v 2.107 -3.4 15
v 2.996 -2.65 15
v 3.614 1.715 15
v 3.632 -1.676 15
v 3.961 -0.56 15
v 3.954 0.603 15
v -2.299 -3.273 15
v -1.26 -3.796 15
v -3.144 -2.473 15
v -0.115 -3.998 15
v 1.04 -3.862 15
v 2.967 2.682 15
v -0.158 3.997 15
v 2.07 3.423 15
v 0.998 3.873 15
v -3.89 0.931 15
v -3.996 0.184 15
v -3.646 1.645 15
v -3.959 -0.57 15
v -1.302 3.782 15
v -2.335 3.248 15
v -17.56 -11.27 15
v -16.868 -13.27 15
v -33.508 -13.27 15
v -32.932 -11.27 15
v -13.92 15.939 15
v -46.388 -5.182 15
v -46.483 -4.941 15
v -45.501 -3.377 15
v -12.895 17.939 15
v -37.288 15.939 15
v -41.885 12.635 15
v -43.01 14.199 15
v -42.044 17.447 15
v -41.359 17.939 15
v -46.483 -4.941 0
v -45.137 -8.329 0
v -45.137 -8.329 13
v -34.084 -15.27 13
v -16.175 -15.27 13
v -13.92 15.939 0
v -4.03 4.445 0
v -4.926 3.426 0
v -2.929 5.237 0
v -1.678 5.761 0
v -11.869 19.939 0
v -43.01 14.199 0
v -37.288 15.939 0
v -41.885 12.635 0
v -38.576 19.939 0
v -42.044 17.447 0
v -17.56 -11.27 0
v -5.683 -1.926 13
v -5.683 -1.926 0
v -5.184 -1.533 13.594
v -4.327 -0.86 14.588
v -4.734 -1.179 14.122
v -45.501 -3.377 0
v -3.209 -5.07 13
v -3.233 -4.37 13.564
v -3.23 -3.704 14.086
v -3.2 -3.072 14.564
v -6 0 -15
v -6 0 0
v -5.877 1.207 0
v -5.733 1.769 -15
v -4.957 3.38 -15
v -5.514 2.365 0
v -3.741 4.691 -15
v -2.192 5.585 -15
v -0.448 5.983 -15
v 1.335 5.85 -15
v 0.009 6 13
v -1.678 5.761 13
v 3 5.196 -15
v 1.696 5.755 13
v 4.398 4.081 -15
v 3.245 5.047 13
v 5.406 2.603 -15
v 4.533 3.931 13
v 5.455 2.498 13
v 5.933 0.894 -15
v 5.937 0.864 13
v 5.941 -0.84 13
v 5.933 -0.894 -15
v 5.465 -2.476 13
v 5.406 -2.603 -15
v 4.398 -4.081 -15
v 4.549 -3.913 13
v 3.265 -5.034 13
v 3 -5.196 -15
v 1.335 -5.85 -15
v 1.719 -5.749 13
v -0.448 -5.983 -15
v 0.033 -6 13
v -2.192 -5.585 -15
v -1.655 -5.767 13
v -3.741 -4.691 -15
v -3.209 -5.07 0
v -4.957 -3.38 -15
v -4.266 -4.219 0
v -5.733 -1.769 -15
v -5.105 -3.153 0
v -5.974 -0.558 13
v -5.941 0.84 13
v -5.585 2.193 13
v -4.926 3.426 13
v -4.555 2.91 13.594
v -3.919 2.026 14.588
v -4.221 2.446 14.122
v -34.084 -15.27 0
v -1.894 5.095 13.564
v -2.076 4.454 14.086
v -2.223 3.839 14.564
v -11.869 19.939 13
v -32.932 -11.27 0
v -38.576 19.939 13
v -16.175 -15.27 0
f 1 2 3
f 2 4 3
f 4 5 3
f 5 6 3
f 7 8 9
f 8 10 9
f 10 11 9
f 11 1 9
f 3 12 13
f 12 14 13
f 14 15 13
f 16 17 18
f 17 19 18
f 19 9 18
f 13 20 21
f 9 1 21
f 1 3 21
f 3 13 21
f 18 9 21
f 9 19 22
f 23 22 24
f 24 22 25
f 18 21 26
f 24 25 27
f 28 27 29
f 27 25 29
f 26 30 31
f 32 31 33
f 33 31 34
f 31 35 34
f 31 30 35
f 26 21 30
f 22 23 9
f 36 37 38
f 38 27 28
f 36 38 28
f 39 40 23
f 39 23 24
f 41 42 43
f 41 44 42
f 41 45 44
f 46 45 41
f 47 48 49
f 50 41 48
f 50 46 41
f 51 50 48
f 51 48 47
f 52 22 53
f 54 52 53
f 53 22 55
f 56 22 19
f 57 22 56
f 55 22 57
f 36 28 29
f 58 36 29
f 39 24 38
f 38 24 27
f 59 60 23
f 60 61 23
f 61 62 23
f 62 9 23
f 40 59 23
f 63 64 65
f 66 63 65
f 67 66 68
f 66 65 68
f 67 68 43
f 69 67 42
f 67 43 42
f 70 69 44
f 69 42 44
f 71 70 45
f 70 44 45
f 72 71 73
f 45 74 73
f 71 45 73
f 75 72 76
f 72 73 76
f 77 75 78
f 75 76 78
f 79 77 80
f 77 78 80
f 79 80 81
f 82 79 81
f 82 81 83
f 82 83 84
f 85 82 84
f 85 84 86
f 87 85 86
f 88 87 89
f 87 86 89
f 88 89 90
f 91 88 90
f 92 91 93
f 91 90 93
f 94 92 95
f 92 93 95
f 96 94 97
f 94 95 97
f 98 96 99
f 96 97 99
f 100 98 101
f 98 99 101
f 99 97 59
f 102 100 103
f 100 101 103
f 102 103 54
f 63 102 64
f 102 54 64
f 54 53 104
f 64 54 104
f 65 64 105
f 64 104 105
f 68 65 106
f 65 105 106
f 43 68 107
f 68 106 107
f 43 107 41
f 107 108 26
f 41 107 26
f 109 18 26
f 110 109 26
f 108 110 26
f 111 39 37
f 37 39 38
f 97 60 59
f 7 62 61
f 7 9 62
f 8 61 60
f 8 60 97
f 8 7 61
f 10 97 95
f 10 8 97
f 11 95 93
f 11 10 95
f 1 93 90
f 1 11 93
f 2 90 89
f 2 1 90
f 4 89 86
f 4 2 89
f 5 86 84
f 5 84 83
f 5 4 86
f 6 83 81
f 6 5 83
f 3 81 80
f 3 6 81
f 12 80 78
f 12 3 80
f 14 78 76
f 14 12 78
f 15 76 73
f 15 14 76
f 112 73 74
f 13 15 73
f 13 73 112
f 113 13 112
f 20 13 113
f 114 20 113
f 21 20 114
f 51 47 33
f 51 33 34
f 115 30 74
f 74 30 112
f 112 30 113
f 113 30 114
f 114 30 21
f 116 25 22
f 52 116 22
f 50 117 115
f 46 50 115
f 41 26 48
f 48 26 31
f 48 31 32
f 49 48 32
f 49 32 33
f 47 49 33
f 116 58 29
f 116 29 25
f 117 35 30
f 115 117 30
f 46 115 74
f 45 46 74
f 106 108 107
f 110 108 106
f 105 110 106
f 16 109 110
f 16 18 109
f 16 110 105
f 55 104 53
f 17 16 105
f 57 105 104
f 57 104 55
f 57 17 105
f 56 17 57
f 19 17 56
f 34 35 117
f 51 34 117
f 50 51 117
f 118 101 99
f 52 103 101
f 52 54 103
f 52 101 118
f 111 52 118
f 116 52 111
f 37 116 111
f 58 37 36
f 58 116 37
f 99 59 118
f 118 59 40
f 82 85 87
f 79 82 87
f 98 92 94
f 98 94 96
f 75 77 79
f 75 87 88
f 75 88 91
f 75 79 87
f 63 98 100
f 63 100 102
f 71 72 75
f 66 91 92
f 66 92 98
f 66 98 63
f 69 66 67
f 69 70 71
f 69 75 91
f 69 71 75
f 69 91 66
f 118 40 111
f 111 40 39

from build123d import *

# Parameters (mm, degrees)
SKETCH1_R           = 6
BOSS_EXTRUDE1_DEPTH = 15
BOSS_EXTRUDE2_DEPTH = 15
CHAMFER1_SIZE       = 2
SKETCH3_R           = 6
BOSS_EXTRUDE3_DEPTH = 15


with BuildPart() as part:
    # Sketch1 → Boss-Extrude1 (new body)
    with BuildSketch(Plane.XY):
        Circle(SKETCH1_R)
    extrude(amount=BOSS_EXTRUDE1_DEPTH)

    # Sketch2 → Boss-Extrude2 (add)
    with BuildSketch(Plane.XY.offset(15)):
        Polygon((-34.083999274, -15.270349256), (-45.136951092, -8.328867942), (-46.483233706, -4.941481314), (-45.500714563, -3.377011677), (-32.932117748, -11.270349256), (-17.560265153, -11.270349256), (-2.741776156, 0.387724819), (-13.920336004, 15.939232255), (-37.288016477, 15.939232255), (-41.885217055, 12.634724187), (-43.009602546, 14.198958718), (-42.043738714, 17.446929746), (-38.576470878, 19.939232255), (-11.869418747, 19.939232255), (2.741776156, -0.387724819), (-16.1754142, -15.270349256), align=None)
    extrude(amount=-BOSS_EXTRUDE2_DEPTH)

    # Chamfer1
    chamfer1_edges = [part.edges().sort_by_distance(p)[0] for p in [
        (-6.773577635, 12.849945977, 15),
        (-25.222944812, 19.939232255, 15),
        (-39.610475183, -11.799608599, 15),
        (-25.129706737, -15.270349256, 15),
        (-9.692346894, -10.169958865, 15),
        (-5.940891532, 0.840123687, 15),
        (5.940891532, -0.840123687, 15),
    ]]
    chamfer(chamfer1_edges, length=CHAMFER1_SIZE)

    # Sketch3 → Boss-Extrude3 (add)
    with BuildSketch(Plane(origin=(0, 0, 0), x_dir=(-1, 0, 0), z_dir=(0, 0, -1))):
        Circle(SKETCH3_R)
    extrude(amount=BOSS_EXTRUDE3_DEPTH)


solid = part.part
